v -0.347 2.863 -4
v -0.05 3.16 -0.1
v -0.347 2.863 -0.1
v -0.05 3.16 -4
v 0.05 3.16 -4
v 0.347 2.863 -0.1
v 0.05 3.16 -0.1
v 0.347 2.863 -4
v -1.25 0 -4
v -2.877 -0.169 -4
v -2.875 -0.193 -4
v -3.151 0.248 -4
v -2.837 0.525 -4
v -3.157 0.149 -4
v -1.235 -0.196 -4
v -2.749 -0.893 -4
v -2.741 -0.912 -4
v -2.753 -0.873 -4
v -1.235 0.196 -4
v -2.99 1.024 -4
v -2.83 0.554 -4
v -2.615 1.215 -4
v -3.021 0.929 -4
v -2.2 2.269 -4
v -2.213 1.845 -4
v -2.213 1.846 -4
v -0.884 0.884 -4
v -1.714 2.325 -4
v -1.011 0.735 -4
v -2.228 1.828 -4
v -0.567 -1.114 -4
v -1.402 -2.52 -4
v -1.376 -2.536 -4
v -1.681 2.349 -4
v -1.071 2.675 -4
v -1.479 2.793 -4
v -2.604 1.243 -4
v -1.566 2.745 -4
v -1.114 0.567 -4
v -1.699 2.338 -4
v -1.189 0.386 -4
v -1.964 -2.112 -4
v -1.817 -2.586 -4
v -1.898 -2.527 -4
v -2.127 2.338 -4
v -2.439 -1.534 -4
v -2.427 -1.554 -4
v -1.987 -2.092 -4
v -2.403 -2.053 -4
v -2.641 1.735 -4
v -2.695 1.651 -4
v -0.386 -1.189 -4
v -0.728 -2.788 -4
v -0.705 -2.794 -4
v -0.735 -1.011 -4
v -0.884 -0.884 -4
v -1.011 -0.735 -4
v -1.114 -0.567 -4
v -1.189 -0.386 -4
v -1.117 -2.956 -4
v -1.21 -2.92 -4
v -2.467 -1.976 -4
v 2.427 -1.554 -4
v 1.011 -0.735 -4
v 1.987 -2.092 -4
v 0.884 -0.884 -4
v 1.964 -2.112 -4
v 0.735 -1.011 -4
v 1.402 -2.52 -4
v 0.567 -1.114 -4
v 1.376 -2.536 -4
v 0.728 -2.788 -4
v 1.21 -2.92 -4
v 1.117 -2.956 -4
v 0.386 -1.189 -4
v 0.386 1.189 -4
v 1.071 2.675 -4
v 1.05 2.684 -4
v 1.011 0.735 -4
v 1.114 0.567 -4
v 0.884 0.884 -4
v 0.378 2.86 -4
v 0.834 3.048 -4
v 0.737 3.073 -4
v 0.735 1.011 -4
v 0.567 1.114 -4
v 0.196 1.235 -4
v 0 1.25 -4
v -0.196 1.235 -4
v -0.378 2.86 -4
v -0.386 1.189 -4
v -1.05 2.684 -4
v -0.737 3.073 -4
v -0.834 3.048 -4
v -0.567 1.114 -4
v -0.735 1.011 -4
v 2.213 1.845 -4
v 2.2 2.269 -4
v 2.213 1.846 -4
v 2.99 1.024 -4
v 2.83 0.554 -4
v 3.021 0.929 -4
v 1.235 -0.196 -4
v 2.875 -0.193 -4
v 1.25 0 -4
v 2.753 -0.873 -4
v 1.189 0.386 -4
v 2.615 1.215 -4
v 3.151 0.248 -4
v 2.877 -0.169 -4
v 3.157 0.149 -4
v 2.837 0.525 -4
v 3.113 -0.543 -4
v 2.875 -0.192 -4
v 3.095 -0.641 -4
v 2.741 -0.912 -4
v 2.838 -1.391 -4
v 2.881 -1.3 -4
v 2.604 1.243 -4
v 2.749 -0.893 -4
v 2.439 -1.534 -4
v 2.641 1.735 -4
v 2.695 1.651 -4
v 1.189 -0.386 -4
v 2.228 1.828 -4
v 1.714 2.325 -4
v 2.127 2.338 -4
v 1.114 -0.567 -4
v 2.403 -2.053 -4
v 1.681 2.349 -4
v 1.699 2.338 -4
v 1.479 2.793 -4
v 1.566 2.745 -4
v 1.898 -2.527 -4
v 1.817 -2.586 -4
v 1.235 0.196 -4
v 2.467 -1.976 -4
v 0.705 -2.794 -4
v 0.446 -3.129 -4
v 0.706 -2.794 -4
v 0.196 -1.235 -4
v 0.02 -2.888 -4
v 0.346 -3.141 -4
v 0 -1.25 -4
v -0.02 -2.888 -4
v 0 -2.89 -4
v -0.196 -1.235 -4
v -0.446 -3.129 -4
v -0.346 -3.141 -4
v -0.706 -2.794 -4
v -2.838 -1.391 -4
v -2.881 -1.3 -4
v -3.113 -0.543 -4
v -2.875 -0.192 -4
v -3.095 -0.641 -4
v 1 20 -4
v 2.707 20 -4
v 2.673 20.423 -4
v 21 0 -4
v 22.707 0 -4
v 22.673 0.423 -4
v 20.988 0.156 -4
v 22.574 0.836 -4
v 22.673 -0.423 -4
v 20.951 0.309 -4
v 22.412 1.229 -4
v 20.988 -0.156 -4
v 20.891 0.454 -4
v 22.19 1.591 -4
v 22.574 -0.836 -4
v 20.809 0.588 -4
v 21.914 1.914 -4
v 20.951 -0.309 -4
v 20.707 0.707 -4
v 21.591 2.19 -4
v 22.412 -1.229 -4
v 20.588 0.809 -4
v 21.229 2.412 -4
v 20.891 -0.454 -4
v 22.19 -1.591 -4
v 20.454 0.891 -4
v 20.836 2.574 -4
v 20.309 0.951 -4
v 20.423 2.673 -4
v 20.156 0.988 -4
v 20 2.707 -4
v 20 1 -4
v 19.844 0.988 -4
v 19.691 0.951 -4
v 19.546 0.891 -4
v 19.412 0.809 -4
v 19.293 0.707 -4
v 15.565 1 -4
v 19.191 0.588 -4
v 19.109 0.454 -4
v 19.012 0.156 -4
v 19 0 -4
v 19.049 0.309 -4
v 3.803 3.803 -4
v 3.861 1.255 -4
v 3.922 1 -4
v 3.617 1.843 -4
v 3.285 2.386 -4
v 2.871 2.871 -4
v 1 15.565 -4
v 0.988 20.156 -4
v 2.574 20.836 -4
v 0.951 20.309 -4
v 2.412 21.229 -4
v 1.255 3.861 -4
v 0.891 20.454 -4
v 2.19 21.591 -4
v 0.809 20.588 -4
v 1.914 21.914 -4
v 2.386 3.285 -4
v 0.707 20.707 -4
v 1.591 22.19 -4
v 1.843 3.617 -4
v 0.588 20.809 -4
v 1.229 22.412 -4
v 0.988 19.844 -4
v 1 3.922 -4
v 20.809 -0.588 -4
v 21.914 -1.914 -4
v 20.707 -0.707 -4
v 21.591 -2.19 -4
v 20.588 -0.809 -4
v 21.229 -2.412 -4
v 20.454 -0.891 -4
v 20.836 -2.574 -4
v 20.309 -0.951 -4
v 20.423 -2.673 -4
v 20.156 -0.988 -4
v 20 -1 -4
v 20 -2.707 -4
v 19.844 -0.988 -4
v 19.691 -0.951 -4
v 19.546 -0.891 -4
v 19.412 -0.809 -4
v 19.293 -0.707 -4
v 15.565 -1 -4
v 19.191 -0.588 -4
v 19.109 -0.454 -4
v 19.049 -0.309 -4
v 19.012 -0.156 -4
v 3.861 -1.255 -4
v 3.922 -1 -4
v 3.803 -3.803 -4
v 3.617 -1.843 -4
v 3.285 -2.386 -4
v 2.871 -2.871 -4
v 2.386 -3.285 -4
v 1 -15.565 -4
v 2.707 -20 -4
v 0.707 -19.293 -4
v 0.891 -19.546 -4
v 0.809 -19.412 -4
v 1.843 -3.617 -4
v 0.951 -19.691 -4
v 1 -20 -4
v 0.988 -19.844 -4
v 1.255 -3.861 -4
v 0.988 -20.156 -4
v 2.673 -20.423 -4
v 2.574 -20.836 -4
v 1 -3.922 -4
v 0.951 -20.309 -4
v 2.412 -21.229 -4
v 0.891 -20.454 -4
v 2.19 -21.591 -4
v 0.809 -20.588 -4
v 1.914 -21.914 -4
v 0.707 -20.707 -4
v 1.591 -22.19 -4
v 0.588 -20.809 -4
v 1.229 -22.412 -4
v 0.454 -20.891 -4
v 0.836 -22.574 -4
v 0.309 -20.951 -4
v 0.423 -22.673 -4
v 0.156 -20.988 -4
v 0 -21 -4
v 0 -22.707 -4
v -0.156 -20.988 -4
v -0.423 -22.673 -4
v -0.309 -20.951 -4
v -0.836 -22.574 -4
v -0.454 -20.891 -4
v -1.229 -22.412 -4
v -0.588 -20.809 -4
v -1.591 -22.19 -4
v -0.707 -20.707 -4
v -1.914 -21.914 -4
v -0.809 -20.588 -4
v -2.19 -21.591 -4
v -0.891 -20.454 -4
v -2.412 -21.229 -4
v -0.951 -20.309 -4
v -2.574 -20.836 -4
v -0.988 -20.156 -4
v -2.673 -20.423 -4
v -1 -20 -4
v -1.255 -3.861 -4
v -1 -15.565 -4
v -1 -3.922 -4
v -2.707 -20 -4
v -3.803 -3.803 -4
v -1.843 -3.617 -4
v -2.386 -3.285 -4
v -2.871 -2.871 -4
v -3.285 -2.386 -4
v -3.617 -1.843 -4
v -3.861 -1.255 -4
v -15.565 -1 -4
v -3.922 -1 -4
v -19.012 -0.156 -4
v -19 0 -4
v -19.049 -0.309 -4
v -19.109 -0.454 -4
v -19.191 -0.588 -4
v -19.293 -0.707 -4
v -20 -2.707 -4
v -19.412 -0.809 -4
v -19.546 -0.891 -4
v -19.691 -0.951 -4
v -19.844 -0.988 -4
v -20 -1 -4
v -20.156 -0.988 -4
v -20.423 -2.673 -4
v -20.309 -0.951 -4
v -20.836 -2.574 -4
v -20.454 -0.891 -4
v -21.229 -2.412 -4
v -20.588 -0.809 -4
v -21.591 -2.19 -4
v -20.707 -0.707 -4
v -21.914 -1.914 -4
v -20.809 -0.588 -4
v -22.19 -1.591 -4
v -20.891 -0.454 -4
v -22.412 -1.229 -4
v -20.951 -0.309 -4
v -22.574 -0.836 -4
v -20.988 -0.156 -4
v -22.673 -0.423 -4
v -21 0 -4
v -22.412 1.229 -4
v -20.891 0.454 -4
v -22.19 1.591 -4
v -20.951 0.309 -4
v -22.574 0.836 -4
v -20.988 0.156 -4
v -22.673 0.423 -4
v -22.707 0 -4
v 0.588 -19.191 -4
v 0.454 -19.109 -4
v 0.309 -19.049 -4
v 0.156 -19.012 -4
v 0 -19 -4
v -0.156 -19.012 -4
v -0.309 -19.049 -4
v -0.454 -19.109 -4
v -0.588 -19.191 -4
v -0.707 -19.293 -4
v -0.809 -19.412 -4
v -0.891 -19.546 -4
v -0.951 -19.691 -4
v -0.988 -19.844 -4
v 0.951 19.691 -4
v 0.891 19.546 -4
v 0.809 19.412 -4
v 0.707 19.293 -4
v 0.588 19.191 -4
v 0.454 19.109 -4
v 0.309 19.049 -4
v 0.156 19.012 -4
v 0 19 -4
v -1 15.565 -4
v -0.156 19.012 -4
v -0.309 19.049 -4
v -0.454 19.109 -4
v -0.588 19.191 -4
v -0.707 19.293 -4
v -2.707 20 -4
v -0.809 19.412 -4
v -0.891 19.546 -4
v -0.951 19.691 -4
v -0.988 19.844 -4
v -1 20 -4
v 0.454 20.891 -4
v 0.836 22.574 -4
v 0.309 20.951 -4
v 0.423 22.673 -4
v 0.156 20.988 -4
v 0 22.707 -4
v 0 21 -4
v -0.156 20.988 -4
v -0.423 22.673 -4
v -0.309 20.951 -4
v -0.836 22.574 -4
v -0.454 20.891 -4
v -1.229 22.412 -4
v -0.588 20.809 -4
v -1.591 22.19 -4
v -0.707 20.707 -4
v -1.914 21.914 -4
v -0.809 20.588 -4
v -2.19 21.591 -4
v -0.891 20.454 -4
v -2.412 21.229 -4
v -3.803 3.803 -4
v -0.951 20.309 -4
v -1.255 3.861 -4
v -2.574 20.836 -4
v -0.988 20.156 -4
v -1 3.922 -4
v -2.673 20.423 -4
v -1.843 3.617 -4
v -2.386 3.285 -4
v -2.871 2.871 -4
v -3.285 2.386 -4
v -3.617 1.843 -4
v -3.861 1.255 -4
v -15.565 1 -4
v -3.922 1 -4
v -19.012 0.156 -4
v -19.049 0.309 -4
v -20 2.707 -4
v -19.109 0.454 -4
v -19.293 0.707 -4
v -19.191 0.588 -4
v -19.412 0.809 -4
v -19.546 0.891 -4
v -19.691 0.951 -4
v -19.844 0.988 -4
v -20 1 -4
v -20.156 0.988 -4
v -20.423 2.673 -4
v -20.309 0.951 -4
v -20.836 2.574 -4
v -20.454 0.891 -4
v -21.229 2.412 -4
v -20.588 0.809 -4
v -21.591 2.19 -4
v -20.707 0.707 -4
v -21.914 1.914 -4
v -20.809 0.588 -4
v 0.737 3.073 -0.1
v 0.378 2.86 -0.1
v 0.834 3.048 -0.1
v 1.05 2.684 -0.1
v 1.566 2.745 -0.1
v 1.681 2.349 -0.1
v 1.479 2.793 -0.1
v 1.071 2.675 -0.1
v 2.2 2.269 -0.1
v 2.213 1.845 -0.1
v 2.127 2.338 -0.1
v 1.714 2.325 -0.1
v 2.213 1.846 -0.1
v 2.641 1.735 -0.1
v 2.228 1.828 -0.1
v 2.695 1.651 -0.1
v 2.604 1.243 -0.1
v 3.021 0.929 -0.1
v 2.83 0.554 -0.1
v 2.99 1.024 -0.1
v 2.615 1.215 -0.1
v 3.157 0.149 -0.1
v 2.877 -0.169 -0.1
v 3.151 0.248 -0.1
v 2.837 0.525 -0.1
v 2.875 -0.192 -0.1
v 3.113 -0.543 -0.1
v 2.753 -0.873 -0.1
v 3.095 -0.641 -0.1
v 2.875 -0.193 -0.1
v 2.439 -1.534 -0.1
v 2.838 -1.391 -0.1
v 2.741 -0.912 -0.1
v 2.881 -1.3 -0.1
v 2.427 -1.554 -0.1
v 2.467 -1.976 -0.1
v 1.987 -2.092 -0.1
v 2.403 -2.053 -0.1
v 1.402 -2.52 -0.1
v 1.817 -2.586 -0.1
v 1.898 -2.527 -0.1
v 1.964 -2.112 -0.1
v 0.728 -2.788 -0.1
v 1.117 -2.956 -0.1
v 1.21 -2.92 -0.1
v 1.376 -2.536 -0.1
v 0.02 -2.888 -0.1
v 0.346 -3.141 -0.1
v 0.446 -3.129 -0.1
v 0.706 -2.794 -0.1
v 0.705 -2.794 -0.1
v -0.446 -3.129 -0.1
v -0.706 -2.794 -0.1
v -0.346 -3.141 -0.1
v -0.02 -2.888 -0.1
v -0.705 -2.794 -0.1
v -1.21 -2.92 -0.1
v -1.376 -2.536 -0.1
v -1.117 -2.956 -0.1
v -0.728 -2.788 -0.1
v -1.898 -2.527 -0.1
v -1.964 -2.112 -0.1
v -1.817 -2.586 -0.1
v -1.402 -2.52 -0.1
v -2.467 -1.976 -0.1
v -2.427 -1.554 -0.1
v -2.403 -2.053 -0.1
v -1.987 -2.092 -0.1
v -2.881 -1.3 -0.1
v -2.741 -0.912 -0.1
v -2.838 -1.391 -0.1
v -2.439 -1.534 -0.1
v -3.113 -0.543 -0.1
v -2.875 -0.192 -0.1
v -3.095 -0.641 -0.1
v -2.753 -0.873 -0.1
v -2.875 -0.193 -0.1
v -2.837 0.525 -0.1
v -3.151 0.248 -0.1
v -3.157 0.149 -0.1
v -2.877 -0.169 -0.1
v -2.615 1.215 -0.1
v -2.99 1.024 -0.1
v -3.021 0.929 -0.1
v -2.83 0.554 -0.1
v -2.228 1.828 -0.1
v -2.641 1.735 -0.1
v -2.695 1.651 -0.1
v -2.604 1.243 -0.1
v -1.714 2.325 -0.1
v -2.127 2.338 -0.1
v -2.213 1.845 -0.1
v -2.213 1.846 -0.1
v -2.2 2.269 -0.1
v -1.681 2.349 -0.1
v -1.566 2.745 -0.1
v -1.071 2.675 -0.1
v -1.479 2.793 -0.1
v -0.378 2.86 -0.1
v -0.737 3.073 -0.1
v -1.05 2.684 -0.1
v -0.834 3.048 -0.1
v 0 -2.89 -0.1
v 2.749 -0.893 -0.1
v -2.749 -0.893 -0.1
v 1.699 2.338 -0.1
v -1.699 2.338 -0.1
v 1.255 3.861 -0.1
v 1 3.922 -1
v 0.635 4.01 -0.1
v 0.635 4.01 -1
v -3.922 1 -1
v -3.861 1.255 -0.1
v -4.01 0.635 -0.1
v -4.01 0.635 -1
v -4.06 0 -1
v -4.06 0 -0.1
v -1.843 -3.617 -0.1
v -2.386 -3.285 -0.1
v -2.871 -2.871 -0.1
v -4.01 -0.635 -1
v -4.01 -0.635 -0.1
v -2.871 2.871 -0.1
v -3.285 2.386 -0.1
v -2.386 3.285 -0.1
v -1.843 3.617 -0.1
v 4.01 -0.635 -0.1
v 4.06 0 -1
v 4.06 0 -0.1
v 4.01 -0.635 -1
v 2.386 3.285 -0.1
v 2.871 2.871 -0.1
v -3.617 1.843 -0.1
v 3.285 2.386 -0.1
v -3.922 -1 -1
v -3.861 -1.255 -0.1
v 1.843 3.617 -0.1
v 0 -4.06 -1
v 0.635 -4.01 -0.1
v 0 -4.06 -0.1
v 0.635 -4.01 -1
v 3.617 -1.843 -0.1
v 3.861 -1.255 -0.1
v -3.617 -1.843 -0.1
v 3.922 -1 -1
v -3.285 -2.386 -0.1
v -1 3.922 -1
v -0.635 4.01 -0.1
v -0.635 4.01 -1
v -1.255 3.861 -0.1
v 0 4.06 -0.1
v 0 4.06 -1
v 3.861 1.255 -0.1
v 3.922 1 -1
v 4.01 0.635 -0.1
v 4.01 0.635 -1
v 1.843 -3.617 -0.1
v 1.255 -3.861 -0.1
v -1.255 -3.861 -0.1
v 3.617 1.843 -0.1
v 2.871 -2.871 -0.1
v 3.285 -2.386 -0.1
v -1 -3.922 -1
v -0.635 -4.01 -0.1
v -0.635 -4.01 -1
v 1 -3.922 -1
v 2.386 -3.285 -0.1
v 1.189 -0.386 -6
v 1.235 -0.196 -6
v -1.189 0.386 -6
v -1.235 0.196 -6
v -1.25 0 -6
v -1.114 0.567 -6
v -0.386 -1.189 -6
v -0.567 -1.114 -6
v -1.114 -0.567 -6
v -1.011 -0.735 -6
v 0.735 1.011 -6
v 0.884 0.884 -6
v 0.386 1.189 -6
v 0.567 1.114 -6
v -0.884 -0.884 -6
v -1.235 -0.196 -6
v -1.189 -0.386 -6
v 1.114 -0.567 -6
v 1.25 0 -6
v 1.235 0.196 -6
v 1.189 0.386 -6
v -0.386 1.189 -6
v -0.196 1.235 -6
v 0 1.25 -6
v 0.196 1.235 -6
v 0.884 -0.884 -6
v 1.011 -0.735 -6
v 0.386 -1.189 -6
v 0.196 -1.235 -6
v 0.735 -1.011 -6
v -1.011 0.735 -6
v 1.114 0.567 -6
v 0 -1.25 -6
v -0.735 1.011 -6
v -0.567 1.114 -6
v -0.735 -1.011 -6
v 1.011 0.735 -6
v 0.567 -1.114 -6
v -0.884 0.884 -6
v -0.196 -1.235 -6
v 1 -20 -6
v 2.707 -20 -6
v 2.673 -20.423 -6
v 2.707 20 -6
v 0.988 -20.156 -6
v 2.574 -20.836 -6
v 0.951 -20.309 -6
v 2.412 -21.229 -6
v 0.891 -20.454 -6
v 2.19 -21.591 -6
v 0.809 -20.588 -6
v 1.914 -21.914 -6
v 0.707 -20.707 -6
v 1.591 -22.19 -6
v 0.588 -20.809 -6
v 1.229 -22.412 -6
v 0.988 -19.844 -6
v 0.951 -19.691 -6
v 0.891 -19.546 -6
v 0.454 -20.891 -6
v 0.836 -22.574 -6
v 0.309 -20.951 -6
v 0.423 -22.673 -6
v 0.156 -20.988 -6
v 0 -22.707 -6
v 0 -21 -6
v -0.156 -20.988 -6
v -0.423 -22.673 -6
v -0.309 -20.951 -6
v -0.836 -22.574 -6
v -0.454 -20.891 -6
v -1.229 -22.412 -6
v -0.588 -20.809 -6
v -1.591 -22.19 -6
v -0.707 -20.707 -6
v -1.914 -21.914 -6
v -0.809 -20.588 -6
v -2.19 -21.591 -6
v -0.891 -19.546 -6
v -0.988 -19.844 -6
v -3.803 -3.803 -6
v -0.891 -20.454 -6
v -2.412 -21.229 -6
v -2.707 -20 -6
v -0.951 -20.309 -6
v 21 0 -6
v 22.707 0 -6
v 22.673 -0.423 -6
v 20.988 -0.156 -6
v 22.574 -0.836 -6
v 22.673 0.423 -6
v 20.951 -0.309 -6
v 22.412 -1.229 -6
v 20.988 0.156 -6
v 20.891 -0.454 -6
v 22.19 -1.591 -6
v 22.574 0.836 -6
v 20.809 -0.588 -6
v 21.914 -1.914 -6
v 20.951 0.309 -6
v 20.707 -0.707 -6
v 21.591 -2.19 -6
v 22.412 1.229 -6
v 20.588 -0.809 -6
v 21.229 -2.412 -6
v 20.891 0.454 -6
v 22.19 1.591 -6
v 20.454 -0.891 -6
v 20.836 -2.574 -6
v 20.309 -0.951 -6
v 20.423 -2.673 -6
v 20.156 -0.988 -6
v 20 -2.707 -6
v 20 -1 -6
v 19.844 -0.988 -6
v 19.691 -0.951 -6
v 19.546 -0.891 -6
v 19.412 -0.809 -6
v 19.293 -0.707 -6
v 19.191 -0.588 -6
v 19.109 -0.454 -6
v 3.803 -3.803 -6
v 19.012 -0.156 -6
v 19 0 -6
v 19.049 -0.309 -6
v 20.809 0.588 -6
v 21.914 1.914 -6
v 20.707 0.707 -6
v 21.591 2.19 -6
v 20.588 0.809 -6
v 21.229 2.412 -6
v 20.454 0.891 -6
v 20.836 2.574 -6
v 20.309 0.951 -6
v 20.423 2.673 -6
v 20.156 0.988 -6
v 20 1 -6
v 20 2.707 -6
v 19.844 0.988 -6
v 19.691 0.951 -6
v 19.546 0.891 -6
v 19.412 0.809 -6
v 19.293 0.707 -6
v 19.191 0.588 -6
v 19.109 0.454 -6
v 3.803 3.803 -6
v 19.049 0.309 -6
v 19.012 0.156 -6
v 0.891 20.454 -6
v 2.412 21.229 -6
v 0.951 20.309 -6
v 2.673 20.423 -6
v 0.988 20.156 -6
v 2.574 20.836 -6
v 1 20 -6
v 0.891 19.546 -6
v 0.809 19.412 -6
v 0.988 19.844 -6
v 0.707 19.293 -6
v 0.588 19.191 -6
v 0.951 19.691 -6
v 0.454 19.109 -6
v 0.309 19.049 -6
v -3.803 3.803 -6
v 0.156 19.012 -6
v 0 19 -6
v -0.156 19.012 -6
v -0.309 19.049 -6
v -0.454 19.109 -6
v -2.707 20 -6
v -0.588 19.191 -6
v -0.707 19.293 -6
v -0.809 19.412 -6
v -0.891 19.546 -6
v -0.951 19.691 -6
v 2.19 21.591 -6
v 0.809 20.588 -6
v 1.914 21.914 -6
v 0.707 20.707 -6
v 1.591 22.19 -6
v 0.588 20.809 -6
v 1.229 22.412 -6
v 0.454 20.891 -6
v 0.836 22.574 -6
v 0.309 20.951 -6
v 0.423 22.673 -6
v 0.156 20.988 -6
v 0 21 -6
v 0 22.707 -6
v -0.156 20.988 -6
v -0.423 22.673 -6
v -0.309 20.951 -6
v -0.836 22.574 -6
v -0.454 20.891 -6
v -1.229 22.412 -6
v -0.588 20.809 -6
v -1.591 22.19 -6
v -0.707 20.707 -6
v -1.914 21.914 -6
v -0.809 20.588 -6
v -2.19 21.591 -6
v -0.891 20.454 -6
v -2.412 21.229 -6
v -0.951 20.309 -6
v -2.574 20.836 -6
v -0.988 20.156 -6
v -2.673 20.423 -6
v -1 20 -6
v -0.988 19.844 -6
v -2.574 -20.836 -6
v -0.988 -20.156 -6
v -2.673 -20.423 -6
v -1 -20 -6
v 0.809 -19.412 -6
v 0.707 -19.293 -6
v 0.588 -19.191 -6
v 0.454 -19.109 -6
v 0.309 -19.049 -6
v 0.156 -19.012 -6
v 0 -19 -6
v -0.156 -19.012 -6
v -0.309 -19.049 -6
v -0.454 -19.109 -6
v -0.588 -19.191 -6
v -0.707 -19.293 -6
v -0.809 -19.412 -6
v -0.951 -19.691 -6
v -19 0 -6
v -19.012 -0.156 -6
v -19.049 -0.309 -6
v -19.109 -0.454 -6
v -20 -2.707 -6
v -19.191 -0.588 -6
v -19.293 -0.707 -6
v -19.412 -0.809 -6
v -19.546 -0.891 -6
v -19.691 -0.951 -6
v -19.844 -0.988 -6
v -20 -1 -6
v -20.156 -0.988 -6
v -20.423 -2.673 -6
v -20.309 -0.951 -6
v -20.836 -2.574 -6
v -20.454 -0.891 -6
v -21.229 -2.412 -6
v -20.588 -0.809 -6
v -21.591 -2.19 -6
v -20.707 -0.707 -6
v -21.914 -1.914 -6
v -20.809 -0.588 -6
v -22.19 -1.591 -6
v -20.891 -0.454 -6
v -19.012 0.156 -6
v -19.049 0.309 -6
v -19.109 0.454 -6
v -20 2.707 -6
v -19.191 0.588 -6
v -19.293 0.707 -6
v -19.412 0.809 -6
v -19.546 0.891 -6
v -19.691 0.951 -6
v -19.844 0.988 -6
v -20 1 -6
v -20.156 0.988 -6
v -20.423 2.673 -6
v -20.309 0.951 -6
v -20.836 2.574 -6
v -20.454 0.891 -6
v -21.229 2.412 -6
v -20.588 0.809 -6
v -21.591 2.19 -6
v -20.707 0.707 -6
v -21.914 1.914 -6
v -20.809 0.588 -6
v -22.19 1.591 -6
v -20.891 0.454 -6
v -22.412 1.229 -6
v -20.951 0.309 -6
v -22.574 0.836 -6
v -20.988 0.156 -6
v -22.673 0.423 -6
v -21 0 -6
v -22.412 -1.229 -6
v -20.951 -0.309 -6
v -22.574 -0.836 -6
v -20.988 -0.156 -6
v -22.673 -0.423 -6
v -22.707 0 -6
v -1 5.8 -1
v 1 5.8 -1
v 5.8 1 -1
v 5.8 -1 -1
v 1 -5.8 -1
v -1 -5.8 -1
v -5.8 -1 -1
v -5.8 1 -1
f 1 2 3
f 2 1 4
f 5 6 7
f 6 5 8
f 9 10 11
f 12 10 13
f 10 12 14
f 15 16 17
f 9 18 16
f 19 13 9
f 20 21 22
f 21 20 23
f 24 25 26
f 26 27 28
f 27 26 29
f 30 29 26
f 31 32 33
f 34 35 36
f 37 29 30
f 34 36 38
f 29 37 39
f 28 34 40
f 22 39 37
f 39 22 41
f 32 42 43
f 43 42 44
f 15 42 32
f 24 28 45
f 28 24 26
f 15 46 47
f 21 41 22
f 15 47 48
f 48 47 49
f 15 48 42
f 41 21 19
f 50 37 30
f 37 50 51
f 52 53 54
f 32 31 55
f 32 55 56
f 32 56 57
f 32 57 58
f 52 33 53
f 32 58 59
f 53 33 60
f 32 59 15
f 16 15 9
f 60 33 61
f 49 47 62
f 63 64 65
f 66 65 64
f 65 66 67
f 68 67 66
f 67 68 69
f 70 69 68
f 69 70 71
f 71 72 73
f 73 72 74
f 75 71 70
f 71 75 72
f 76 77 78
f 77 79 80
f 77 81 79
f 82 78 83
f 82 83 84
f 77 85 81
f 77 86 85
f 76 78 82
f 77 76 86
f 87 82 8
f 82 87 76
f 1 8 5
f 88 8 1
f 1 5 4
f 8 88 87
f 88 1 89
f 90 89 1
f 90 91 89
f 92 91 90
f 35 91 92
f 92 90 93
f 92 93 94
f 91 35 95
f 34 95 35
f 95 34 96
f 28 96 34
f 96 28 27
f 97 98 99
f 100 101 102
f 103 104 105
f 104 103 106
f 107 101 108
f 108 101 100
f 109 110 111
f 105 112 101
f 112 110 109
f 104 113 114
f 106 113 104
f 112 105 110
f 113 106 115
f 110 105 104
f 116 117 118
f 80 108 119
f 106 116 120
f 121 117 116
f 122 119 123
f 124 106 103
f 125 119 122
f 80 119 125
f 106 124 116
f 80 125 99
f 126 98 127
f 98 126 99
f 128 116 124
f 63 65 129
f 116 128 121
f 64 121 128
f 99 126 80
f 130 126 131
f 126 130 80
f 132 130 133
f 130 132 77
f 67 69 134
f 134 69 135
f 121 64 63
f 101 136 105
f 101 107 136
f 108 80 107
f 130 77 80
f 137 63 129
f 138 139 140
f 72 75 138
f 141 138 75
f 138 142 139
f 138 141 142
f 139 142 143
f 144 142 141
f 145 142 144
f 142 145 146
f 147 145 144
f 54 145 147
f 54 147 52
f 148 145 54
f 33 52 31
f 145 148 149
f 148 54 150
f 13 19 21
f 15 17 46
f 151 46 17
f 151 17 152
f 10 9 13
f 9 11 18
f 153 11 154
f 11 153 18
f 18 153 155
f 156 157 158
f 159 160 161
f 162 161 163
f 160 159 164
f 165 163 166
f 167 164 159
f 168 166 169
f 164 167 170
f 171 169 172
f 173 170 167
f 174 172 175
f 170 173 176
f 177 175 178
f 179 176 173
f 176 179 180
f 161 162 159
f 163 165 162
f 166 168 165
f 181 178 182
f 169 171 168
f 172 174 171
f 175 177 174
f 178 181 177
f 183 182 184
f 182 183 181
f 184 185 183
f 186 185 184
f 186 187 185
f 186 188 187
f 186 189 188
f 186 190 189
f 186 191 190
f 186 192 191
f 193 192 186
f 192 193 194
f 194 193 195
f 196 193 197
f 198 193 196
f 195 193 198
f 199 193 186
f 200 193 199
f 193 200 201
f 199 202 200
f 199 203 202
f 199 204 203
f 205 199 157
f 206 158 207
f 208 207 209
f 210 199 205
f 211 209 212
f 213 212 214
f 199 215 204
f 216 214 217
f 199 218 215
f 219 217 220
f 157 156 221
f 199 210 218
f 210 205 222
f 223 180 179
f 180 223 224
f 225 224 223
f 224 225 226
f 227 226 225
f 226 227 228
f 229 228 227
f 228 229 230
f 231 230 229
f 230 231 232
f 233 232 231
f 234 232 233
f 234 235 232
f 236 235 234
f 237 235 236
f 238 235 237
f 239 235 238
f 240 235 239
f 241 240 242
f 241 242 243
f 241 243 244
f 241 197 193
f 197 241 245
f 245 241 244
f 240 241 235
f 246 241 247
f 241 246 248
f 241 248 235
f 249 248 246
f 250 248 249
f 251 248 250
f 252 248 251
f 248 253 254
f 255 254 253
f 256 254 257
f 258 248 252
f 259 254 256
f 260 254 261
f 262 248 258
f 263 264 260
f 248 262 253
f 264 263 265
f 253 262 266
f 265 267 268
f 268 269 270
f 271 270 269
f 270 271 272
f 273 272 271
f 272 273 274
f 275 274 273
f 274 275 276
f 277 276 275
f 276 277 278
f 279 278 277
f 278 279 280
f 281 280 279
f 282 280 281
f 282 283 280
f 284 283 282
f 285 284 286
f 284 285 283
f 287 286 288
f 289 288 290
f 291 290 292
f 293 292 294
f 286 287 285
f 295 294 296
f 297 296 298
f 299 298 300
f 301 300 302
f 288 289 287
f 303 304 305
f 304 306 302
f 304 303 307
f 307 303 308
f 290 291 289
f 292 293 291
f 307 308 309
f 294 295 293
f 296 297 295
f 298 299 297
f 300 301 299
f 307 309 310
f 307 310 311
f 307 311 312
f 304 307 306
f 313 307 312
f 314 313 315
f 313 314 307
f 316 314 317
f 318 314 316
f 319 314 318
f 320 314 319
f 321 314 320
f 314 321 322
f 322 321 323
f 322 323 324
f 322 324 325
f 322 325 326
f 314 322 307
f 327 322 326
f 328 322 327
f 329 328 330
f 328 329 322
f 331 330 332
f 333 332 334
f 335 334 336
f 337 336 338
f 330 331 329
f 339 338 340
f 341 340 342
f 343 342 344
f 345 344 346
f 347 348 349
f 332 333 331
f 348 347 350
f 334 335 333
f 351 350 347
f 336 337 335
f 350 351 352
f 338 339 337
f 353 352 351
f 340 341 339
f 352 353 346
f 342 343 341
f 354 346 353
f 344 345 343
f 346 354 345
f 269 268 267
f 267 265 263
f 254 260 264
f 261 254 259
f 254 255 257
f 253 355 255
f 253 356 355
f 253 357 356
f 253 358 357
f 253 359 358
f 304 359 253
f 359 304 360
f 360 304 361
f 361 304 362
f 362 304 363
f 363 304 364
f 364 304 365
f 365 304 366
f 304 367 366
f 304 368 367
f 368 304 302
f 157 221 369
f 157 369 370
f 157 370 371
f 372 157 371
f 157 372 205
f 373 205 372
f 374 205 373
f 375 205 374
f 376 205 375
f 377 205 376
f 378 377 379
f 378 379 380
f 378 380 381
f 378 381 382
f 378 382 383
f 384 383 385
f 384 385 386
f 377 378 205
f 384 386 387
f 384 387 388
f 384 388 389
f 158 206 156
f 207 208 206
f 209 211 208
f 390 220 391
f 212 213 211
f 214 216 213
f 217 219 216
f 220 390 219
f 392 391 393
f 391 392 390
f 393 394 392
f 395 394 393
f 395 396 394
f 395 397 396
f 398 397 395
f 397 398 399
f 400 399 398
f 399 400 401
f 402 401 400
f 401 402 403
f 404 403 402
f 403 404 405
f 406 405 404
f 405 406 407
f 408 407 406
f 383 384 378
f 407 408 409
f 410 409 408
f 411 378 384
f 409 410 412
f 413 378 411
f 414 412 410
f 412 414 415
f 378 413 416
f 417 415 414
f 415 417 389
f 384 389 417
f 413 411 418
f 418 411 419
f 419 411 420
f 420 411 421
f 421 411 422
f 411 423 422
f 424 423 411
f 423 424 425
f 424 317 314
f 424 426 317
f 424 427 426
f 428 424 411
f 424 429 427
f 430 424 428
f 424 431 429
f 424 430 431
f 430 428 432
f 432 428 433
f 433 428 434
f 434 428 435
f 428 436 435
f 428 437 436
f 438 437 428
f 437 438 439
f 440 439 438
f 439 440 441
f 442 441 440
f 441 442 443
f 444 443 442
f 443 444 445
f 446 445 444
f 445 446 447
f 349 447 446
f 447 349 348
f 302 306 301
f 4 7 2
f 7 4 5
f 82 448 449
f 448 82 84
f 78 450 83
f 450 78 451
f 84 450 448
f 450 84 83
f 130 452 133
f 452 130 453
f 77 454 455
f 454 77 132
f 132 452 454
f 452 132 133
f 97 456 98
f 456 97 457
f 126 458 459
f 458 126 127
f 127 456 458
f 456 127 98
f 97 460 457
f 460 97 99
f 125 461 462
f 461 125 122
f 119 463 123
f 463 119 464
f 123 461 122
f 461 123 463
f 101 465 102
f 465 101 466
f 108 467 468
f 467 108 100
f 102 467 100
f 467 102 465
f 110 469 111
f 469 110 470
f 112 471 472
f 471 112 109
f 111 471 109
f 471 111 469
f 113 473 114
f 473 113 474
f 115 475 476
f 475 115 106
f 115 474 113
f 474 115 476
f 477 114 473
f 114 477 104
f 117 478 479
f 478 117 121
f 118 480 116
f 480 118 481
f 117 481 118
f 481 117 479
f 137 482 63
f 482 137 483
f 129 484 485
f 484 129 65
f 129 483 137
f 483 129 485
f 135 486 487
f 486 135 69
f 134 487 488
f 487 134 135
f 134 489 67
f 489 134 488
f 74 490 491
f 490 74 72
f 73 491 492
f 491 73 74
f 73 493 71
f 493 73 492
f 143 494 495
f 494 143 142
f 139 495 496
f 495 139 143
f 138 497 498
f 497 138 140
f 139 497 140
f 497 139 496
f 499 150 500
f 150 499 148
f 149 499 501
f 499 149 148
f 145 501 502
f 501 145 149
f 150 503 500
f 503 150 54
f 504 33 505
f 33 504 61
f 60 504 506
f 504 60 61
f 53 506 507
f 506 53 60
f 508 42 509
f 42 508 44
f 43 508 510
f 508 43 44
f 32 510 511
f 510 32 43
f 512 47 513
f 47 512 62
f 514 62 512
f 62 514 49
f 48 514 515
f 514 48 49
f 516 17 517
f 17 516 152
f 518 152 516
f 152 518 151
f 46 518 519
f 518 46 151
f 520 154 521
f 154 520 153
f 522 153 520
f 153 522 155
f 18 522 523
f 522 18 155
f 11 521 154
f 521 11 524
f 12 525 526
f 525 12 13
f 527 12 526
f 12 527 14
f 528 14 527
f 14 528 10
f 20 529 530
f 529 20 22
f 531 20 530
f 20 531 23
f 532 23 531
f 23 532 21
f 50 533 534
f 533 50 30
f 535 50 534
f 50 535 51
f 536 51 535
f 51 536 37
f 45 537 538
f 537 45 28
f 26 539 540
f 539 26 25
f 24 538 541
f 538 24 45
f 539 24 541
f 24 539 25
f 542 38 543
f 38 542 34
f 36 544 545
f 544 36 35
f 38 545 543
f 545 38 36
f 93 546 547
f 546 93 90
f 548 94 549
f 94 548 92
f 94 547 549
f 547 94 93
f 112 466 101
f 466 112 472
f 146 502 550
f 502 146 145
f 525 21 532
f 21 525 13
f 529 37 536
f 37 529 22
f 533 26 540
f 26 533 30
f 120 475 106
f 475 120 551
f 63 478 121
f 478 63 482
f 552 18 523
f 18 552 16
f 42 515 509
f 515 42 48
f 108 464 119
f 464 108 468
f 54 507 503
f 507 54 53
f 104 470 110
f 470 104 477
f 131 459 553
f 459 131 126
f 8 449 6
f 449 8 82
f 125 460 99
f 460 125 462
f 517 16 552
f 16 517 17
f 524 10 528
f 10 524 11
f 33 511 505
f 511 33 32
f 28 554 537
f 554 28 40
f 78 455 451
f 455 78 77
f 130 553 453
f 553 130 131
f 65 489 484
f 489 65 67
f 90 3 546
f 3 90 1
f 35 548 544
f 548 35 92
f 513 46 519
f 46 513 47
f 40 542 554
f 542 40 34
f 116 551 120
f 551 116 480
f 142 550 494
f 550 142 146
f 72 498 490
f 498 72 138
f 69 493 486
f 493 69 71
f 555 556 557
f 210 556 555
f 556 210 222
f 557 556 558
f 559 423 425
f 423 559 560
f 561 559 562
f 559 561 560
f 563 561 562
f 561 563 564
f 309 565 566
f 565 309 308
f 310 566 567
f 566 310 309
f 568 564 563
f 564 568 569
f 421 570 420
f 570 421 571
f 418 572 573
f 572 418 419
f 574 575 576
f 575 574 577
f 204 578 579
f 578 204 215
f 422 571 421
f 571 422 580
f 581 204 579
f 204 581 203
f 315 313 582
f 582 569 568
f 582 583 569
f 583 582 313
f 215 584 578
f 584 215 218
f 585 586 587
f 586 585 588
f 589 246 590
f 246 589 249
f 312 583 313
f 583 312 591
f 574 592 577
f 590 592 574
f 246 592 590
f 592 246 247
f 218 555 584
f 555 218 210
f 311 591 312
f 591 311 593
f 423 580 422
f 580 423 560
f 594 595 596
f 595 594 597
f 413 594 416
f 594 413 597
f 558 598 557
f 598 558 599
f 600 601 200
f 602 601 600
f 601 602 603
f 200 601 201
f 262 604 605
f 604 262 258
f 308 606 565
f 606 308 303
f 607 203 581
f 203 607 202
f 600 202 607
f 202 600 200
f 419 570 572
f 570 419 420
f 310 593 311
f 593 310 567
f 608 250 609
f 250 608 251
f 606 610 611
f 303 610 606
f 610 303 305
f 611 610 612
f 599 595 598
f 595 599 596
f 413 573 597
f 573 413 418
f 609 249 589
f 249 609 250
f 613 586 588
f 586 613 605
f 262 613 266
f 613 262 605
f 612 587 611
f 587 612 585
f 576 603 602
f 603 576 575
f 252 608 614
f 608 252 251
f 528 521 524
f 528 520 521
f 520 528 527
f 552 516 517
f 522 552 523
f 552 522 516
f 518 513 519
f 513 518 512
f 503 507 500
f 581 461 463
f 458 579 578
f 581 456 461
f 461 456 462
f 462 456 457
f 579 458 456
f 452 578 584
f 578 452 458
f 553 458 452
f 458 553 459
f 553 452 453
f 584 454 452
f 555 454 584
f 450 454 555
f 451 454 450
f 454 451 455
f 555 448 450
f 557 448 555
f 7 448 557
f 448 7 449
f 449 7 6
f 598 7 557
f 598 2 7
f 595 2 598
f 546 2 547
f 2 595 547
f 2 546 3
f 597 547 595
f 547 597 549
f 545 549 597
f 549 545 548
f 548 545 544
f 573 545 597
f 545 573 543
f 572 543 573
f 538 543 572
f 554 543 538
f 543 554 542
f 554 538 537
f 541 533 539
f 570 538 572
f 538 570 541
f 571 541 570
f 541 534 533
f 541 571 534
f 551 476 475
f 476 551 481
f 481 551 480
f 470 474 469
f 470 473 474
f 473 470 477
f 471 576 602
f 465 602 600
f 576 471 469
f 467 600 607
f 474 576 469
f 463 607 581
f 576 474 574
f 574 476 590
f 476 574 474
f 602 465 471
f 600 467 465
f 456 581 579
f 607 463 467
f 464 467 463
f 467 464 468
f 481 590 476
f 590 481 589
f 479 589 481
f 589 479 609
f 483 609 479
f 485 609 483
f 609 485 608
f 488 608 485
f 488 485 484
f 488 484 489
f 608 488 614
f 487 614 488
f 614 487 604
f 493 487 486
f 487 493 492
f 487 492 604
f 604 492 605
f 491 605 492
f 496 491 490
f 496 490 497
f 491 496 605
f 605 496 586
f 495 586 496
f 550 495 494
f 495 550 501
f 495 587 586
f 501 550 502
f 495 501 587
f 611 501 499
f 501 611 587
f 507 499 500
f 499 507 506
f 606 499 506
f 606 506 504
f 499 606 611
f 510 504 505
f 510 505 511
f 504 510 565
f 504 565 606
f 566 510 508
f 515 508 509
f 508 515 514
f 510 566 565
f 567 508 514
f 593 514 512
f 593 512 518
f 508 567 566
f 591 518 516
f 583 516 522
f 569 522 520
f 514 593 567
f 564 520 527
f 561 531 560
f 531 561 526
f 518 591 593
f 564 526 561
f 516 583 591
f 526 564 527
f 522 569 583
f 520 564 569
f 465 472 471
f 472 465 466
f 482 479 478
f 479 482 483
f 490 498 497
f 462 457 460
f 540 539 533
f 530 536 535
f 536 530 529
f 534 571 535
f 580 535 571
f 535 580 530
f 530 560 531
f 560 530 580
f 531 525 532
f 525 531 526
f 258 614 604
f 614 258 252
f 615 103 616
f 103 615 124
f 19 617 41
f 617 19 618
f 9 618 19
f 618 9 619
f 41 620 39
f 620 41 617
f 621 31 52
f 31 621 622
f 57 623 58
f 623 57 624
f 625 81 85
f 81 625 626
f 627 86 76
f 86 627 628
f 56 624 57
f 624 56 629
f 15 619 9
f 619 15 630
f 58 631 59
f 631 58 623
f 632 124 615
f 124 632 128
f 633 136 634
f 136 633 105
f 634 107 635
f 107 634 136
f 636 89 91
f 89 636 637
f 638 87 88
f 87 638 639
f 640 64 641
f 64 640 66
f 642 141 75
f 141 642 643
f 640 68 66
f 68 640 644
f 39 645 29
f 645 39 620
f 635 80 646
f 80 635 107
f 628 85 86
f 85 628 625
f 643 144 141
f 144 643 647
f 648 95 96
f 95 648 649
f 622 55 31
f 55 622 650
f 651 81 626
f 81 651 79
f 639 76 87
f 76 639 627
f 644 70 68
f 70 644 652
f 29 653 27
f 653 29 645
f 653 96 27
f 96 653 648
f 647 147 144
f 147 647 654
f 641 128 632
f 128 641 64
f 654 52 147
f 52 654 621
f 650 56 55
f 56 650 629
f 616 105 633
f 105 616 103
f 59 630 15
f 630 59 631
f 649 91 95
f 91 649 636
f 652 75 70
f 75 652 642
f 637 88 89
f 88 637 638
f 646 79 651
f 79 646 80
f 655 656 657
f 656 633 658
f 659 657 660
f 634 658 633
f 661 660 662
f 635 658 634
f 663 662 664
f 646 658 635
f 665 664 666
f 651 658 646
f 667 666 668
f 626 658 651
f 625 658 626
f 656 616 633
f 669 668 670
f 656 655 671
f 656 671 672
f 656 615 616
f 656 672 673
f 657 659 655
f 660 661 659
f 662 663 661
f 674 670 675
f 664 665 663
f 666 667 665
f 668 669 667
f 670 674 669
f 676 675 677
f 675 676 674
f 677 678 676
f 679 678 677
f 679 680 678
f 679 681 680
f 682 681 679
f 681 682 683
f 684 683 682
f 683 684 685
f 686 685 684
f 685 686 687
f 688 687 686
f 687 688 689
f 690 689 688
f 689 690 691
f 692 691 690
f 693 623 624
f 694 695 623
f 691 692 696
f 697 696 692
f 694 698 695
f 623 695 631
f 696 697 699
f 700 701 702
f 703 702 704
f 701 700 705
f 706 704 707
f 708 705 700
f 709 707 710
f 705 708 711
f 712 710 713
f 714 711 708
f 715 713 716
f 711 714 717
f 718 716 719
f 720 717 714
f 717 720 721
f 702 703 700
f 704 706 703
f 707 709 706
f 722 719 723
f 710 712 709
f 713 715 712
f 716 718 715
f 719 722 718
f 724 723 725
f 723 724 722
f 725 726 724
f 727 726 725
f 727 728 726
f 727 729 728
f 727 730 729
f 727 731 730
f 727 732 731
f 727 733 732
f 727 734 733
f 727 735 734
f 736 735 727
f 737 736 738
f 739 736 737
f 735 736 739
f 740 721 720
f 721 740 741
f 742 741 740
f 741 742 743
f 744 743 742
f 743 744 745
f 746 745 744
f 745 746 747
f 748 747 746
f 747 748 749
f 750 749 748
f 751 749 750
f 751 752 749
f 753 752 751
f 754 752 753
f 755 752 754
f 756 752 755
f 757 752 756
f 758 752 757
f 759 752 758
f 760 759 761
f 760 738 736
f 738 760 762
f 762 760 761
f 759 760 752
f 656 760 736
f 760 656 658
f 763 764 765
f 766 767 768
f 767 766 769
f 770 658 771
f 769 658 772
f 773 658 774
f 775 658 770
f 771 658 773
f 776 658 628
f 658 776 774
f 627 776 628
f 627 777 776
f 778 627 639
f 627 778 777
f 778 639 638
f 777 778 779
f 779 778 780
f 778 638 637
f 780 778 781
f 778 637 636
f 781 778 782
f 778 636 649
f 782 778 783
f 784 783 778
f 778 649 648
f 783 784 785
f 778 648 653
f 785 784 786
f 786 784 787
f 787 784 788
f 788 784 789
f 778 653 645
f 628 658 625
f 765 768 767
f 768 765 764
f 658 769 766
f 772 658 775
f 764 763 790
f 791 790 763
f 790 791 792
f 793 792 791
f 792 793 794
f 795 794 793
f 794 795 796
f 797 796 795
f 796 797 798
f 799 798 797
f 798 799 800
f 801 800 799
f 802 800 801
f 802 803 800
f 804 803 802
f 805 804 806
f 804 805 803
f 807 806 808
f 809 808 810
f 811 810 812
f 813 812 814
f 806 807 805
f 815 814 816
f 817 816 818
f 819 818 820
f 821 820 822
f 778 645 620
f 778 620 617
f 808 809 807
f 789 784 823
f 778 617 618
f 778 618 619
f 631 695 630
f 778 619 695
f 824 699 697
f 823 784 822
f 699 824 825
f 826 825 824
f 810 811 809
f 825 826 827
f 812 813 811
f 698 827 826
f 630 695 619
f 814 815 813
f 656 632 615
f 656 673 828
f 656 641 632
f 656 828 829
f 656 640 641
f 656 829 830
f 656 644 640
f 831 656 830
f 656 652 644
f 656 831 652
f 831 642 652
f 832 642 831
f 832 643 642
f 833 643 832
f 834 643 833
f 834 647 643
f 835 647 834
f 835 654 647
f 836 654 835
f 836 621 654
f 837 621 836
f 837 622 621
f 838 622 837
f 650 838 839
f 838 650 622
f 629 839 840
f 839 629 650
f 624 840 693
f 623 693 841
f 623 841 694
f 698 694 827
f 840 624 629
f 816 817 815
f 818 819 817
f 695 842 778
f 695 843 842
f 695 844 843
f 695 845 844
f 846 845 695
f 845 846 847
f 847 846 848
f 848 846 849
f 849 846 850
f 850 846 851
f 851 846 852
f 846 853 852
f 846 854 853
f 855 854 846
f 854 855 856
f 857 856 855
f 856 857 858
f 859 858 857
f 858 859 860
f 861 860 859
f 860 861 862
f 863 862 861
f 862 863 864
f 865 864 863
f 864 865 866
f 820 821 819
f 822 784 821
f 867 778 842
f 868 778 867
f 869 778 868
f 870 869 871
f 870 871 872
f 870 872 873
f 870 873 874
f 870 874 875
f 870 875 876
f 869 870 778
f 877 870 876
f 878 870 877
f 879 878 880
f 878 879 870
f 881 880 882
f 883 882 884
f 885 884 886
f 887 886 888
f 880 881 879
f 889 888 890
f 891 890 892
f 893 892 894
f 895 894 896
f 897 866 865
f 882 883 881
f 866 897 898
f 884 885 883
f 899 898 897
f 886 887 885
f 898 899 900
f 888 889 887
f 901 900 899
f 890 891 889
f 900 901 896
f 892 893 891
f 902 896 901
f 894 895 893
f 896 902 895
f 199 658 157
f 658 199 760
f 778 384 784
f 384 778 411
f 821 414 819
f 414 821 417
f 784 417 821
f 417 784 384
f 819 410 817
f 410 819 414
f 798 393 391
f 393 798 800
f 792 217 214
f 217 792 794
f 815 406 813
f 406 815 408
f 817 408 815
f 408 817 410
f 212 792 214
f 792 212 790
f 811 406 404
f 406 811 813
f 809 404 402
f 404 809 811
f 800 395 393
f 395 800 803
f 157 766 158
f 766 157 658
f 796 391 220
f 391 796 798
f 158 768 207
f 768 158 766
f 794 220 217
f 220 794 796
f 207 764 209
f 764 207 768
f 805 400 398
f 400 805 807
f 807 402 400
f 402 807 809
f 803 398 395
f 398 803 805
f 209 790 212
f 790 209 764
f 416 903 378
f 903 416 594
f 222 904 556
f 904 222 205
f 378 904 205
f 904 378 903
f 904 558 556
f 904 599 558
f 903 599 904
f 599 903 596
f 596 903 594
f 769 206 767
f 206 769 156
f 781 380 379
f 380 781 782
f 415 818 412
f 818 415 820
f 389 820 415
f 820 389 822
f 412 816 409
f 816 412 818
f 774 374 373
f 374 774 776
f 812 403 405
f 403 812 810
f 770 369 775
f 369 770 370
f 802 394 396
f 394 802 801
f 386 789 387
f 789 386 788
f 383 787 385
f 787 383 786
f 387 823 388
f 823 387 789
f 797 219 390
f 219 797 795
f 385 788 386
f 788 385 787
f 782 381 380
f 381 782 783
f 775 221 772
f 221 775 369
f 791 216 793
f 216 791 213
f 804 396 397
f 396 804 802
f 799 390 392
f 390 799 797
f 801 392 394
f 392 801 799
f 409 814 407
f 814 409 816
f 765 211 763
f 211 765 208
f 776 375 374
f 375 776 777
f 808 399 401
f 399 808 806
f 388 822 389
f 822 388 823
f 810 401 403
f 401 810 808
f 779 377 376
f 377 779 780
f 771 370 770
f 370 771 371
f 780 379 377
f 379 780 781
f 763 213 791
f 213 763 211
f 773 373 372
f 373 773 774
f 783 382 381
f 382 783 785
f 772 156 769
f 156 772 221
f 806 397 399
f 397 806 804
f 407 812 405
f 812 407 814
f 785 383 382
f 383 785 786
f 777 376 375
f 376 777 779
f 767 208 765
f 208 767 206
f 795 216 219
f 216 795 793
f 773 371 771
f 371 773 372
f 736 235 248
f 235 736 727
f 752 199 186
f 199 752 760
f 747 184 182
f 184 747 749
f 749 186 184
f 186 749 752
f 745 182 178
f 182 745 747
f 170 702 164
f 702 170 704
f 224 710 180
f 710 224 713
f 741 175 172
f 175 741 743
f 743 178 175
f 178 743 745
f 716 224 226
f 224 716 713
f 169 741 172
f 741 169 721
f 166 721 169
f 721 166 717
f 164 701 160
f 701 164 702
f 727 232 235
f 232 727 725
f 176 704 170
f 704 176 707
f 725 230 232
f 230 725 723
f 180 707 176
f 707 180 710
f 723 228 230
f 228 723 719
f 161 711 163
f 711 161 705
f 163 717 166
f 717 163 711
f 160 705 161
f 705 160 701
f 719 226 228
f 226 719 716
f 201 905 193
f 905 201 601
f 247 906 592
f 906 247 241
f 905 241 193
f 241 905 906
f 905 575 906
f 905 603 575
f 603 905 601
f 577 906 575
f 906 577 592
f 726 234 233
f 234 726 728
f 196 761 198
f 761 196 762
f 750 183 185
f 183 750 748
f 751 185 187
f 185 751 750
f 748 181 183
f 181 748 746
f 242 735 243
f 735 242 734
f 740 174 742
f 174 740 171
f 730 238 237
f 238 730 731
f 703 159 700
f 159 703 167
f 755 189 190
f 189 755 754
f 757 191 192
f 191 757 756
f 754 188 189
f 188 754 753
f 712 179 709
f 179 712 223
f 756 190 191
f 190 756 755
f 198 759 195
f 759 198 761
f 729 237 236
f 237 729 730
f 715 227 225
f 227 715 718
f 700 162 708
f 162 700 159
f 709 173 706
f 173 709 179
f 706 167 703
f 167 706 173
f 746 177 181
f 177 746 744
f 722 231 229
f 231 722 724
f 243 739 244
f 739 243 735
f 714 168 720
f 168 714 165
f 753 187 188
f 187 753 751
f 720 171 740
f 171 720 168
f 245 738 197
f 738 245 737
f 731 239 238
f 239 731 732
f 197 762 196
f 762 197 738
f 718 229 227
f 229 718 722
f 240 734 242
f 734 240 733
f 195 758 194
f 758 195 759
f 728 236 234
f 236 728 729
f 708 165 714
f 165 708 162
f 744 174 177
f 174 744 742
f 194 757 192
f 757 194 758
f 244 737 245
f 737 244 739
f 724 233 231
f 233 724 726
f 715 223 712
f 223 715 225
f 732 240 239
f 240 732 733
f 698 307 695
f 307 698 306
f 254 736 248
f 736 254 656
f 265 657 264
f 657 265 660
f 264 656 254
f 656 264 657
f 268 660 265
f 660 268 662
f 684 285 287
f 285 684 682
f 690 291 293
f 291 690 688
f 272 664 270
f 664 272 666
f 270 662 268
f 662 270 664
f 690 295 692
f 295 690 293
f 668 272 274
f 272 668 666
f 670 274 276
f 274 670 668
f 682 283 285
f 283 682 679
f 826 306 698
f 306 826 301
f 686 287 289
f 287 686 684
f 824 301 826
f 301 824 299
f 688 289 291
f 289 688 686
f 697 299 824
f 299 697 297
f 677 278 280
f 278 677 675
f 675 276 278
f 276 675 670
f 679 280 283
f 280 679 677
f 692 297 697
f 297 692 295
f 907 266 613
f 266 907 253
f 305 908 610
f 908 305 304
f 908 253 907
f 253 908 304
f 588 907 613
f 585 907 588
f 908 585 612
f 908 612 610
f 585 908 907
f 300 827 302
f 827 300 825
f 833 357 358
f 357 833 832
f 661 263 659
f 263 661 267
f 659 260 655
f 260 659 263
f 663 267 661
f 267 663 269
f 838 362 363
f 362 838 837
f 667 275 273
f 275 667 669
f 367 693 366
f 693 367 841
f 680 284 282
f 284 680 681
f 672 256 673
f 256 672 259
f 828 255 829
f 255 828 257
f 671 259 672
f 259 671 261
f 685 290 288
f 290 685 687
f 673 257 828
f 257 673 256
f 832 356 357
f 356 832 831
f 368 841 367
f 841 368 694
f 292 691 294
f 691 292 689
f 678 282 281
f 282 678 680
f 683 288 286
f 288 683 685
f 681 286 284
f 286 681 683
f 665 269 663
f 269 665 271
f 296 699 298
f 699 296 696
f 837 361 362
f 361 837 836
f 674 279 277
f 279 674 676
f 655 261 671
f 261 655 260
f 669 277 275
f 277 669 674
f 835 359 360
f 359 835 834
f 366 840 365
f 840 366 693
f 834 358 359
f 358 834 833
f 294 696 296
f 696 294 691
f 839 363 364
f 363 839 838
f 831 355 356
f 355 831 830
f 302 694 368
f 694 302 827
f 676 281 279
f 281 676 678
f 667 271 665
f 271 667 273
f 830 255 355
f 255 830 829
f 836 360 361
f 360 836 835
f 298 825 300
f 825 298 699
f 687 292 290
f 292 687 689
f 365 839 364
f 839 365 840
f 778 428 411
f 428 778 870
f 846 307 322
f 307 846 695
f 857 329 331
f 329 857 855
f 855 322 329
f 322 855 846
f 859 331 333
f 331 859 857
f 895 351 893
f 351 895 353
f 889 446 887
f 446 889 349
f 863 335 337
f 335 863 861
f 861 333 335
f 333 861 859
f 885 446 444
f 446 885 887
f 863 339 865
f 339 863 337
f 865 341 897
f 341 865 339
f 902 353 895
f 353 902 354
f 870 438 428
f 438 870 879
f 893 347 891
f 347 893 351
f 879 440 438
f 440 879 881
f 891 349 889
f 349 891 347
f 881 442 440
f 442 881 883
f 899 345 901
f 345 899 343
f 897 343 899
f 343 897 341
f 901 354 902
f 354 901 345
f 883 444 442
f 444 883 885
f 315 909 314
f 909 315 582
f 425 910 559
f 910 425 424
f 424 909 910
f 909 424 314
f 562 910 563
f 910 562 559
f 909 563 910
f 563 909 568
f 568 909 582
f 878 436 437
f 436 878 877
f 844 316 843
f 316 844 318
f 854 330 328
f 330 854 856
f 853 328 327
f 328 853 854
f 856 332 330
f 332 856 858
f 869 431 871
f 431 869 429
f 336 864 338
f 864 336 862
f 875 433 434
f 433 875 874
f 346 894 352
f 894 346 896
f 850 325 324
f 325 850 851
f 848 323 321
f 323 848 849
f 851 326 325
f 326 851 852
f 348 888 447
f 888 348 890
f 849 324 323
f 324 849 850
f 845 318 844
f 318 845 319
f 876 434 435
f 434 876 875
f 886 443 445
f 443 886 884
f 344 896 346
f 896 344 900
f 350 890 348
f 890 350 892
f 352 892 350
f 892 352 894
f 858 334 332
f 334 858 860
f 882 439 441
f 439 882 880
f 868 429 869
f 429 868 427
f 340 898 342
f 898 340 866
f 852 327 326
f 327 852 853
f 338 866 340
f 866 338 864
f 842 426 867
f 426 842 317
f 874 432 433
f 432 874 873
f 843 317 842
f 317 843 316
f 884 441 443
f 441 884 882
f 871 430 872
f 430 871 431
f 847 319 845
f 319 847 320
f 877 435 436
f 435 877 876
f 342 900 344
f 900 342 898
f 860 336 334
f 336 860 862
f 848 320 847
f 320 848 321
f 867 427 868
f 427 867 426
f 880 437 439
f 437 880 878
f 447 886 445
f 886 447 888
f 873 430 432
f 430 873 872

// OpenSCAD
/**
 *  Parametric servo arm generator for OpenScad
 *  Générateur de palonnier de servo pour OpenScad
 *
 *  Copyright (c) 2012 Charles Rincheval.  All rights reserved.
 *
 *  This library is free software; you can redistribute it and/or
 *  modify it under the terms of the GNU Lesser General Public
 *  License as published by the Free Software Foundation; either
 *  version 2.1 of the License, or (at your option) any later version.
 *
 *  This library is distributed in the hope that it will be useful,
 *  but WITHOUT ANY WARRANTY; without even the implied warranty of
 *  MERCHANTABILITY or FITNESS FOR A PARTICULAR PURPOSE.  See the GNU
 *  Lesser General Public License for more details.
 *
 *  You should have received a copy of the GNU Lesser General Public
 *  License along with this library; if not, write to the Free Software
 *  Foundation, Inc., 51 Franklin St, Fifth Floor, Boston, MA  02110-1301  USA
 *
 *  Last update :
 *  https://github.com/hugokernel/OpenSCAD_ServoArms
 *
 *  http://www.digitalspirit.org/
 */

$fn = 40;

/**
 *  Clear between arm head and servo head
 *  With PLA material, use clear : 0.3, for ABS, use 0.2
 */
SERVO_HEAD_CLEAR = 0.2;

/**
 *  Head / Tooth parameters
 *  Futaba 3F Standard Spline
 *  http://www.servocity.com/html/futaba_servo_splines.html
 *
 *  First array (head related) :
 *  0. Head external diameter
 *  1. Head heigth
 *  2. Head thickness
 *  3. Head screw diameter
 *
 *  Second array (tooth related) :
 *  0. Tooth count
 *  1. Tooth height
 *  2. Tooth length
 *  3. Tooth width
 */
FUTABA_3F_SPLINE = [
    [5.92, 4, 1.1, 2.5],
    [25, 0.3, 0.7, 0.1]
];

module servo_futaba_3f(length, count) {
    servo_arm(FUTABA_3F_SPLINE, [length, count]);
}

/**
 *  If you want to support a new servo, juste add a new spline definition array
 *  and a module named like servo_XXX_YYY where XXX is servo brand and YYY is the
 *  connection type (3f) or the servo type (s3003)
 */

module servo_standard(length, count) {
    servo_futaba_3f(length, count);
}

/**
 *  Tooth
 *
 *    |<-w->|
 *    |_____|___
 *    /     \  ^h
 *  _/       \_v
 *   |<--l-->|
 *
 *  - tooth length (l)
 *  - tooth width (w)
 *  - tooth height (h)
 *  - height
 *
 */
module servo_head_tooth(length, width, height, head_height) {
    linear_extrude(height = head_height) {
        polygon([[-length / 2, 0], [-width / 2, height], [width / 2, height], [length / 2,0]]);
    }
}

/**
 *  Servo head
 */
module servo_head(params, clear = SERVO_HEAD_CLEAR) {

    head = params[0];
    tooth = params[1];

    head_diameter = head[0];
    head_heigth = head[1];

    tooth_count = tooth[0];
    tooth_height = tooth[1];
    tooth_length = tooth[2];
    tooth_width = tooth[3];

    % cylinder(r = head_diameter / 2, h = head_heigth + 1);

    cylinder(r = head_diameter / 2 - tooth_height + 0.03 + clear, h = head_heigth);

    for (i = [0 : tooth_count]) {
        rotate([0, 0, i * (360 / tooth_count)]) {
            translate([0, head_diameter / 2 - tooth_height + clear, 0]) {
                servo_head_tooth(tooth_length, tooth_width, tooth_height, head_heigth);
            }
        }
    }
}

/**
 *  Servo hold
 *  - Head / Tooth parameters
 *  - Arms params (length and count)
 */
module servo_arm(params, arms) {

    head = params[0];
    tooth = params[1];

    head_diameter = head[0];
    head_heigth = head[1];
    head_thickness = head[2];
    head_screw_diameter = head[3];

    tooth_length = tooth[2];
    tooth_width = tooth[3];

    arm_length = arms[0];
    arm_count = arms[1];

    /**
     *  Servo arm
     *  - length is from center to last hole
     */
    module arm(tooth_length, tooth_width, head_height, head_heigth, hole_count = 1) {

        arm_screw_diameter = 2;

        difference() {
            union() {
                cylinder(r = tooth_width / 2, h = head_heigth);

                linear_extrude(height = head_heigth) {
                    polygon([
                        [-tooth_width / 2, 0], [-tooth_width / 3, tooth_length],
                        [tooth_width / 3, tooth_length], [tooth_width / 2, 0]
                    ]);
                }

                translate([0, tooth_length, 0]) {
                    cylinder(r = tooth_width / 3, h = head_heigth);
                }

                if (tooth_length >= 12) {
                    translate([-head_heigth / 2 + 2, 3.8, -4]) {
                        rotate([90, 0, 0]) {
                            rotate([0, -90, 0]) {
                                linear_extrude(height = head_heigth) {
                                    polygon([
                                        [-tooth_length / 1.7, 4], [0, 4], [0, - head_height + 5],
                                        [-2, - head_height + 5]
                                    ]);
                                }
                            }
                        }
                    }
                }
            }

            // Hole
            for (i = [0 : hole_count - 1]) {
                //translate([0, length - (length / hole_count * i), -1]) {
                translate([0, tooth_length - (4 * i), -1]) {
                    cylinder(r = arm_screw_diameter / 2, h = 10);
                }
            }

            cylinder(r = head_screw_diameter / 2, h = 10);
        }
    }

    difference() {
        translate([0, 0, 0.1]) {
            cylinder(r = head_diameter / 2 + head_thickness, h = head_heigth + 1);
        }

        cylinder(r = head_screw_diameter / 2, h = 10);

        servo_head(params);
    }

    arm_thickness = head_thickness;

    // Arm
    translate([0, 0, head_heigth]) {
        for (i = [0 : arm_count - 1]) {
            rotate([0, 0, i * (360 / arm_count)]) {
                arm(arm_length, head_diameter + arm_thickness * 2, head_heigth, 2);
            }
        }
    }
}

module demo() {
    rotate([0, 180, 0])
        servo_standard(20, 4);
}

demo();
